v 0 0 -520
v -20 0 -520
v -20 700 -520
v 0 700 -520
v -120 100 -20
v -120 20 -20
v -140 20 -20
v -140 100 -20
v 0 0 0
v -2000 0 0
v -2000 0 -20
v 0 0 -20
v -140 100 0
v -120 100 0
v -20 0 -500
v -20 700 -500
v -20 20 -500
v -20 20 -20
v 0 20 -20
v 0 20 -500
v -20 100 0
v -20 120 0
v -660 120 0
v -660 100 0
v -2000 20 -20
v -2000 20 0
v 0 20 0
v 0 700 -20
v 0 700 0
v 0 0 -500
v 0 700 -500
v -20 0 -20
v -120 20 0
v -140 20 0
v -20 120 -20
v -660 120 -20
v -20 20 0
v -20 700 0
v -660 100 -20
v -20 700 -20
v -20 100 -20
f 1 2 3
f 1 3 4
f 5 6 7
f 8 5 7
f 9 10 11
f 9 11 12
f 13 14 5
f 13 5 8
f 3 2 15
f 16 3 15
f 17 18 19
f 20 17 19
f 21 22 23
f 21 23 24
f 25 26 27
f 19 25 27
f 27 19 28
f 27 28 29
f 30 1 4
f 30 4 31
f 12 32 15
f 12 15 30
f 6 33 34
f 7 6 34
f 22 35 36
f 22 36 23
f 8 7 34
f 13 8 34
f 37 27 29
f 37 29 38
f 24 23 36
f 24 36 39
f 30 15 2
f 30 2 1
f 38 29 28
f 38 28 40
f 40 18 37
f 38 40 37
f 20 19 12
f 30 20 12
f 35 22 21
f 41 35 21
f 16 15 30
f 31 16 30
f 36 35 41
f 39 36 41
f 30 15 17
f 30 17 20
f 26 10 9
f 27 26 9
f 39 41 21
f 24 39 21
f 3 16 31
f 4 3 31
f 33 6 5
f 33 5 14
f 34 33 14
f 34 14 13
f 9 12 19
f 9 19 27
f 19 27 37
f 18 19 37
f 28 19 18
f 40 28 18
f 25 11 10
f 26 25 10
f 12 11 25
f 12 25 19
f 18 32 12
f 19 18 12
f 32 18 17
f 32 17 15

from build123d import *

# Parameters (mm, degrees)
F0_W      = 2000
F0_H      = 20
F1_DEPTH  = 20
F2_W      = 20
F2_H      = 20
F3_DEPTH  = 680
F4_W      = 20
F4_H      = 20
F5_DEPTH  = 480
F6_W      = 20
F6_H      = 20
F7_DEPTH  = 700
F8_W      = 20
F8_H      = 20
F9_DEPTH  = 640
F10_W     = 20
F10_H     = 20
F11_DEPTH = 80


with BuildPart() as f1:
    # F0 (on Front) → F1 (new body)
    with BuildSketch(Plane.XZ):
        with Locations((-1000, -10)):
            Rectangle(F0_W, F0_H)
    extrude(amount=-F1_DEPTH)


with BuildPart() as f3:
    # F2 (on face) → F3 (new body)
    with BuildSketch(Plane(origin=(0, 20, 0), x_dir=(-1, 0, 0), z_dir=(0, 1, 0))):
        with Locations((10, -10)):
            Rectangle(F2_W, F2_H)
    extrude(amount=F3_DEPTH)


with BuildPart() as f5:
    # F4 (on face) → F5 (new body)
    with BuildSketch(Plane(origin=(0, 0, -20), x_dir=(1, 0, 0), z_dir=(0, 0, -1))):
        with Locations((-10, -10)):
            Rectangle(F4_W, F4_H)
    extrude(amount=F5_DEPTH)


with BuildPart() as f7:
    # F6 (on face) → F7 (new body, through all)
    with BuildSketch(Plane.XZ):
        with Locations((-10, -510)):
            Rectangle(F6_W, F6_H)
    extrude(amount=-F7_DEPTH)


with BuildPart() as f9:
    # F8 (on face) → F9 (new body)
    with BuildSketch(Plane(origin=(-20, 0, 0), x_dir=(0, -1, 0), z_dir=(-1, 0, 0))):
        with Locations((-110, -10)):
            Rectangle(F8_W, F8_H)
    extrude(amount=F9_DEPTH)


with BuildPart() as f11:
    # F10 (on face) → F11 (new body, through all)
    with BuildSketch(Plane(origin=(0, 20, 0), x_dir=(-1, 0, 0), z_dir=(0, 1, 0))):
        with Locations((130, -10)):
            Rectangle(F10_W, F10_H)
    extrude(amount=F11_DEPTH)


solid = Compound([f1.part, f3.part, f5.part, f7.part, f9.part, f11.part])
